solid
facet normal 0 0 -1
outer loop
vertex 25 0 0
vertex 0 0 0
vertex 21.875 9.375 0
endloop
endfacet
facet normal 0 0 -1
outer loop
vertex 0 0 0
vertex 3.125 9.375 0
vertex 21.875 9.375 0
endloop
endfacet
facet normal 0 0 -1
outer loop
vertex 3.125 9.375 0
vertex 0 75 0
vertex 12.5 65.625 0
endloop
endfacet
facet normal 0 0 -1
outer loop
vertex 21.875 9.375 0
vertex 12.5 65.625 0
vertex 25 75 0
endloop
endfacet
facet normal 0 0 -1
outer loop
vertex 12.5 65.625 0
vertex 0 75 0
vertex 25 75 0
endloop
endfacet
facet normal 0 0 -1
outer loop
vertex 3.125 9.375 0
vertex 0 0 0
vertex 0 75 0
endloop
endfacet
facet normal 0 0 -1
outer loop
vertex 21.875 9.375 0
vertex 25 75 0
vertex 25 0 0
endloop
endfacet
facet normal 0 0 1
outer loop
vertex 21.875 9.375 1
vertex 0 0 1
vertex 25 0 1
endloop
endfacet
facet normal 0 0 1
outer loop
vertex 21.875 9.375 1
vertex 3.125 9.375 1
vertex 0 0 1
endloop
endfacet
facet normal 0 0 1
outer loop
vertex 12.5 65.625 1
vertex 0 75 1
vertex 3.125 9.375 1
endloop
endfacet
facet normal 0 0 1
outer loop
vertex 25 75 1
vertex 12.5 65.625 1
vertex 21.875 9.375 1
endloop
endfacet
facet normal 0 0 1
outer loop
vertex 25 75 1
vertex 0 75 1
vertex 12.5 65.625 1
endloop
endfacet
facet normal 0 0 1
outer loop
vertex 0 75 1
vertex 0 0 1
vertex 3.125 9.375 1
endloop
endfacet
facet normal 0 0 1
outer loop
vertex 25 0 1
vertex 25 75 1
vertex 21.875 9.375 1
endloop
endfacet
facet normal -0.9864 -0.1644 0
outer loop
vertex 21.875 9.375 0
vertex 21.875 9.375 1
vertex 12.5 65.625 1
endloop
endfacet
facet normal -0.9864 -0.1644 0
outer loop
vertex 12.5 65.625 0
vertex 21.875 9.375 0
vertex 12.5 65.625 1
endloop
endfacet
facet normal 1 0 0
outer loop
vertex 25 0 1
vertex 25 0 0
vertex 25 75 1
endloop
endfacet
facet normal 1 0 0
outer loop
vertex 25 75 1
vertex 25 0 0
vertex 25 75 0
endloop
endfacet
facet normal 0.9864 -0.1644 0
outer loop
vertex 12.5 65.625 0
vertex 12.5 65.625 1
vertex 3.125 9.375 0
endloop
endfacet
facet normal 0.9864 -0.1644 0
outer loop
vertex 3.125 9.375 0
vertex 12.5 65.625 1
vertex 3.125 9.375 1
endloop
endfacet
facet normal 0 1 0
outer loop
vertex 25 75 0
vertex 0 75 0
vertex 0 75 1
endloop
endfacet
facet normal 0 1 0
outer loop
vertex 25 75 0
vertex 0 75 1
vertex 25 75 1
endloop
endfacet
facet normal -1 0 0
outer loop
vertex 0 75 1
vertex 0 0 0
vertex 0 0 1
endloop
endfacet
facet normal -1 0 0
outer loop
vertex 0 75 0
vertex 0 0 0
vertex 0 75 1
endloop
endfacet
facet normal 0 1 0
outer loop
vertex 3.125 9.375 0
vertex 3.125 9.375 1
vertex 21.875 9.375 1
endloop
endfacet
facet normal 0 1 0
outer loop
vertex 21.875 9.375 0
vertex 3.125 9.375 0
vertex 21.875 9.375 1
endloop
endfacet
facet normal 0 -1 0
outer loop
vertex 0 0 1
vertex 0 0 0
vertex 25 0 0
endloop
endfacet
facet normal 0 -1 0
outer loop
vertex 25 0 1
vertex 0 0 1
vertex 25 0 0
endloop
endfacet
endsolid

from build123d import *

# Parameters (mm, degrees)
PAD003_DEPTH      = 2
PAD003_DEPTH_BACK = 2
SKETCH019_W       = 25
SKETCH019_H       = 75
PAD018_DEPTH      = 1


with BuildPart() as body003:
    # Sketch004 → Pad003 (new body, two sides)
    with BuildSketch(Plane.XY) as pad003_sk:
        Polygon((12.5, 65.625), (3.125, 9.375), (21.875, 9.375), align=None)
    extrude(amount=PAD003_DEPTH)
    extrude(pad003_sk.sketch, amount=-PAD003_DEPTH_BACK)


with BuildPart() as body017:
    # Sketch019 → Pad018 (new body)
    with BuildSketch(Plane.XY):
        with Locations((12.5, 37.5)):
            Rectangle(SKETCH019_W, SKETCH019_H)
    extrude(amount=PAD018_DEPTH)

    # Boolean002: cut Body003
    add(body003.part, mode=Mode.SUBTRACT)


solid = body017.part
